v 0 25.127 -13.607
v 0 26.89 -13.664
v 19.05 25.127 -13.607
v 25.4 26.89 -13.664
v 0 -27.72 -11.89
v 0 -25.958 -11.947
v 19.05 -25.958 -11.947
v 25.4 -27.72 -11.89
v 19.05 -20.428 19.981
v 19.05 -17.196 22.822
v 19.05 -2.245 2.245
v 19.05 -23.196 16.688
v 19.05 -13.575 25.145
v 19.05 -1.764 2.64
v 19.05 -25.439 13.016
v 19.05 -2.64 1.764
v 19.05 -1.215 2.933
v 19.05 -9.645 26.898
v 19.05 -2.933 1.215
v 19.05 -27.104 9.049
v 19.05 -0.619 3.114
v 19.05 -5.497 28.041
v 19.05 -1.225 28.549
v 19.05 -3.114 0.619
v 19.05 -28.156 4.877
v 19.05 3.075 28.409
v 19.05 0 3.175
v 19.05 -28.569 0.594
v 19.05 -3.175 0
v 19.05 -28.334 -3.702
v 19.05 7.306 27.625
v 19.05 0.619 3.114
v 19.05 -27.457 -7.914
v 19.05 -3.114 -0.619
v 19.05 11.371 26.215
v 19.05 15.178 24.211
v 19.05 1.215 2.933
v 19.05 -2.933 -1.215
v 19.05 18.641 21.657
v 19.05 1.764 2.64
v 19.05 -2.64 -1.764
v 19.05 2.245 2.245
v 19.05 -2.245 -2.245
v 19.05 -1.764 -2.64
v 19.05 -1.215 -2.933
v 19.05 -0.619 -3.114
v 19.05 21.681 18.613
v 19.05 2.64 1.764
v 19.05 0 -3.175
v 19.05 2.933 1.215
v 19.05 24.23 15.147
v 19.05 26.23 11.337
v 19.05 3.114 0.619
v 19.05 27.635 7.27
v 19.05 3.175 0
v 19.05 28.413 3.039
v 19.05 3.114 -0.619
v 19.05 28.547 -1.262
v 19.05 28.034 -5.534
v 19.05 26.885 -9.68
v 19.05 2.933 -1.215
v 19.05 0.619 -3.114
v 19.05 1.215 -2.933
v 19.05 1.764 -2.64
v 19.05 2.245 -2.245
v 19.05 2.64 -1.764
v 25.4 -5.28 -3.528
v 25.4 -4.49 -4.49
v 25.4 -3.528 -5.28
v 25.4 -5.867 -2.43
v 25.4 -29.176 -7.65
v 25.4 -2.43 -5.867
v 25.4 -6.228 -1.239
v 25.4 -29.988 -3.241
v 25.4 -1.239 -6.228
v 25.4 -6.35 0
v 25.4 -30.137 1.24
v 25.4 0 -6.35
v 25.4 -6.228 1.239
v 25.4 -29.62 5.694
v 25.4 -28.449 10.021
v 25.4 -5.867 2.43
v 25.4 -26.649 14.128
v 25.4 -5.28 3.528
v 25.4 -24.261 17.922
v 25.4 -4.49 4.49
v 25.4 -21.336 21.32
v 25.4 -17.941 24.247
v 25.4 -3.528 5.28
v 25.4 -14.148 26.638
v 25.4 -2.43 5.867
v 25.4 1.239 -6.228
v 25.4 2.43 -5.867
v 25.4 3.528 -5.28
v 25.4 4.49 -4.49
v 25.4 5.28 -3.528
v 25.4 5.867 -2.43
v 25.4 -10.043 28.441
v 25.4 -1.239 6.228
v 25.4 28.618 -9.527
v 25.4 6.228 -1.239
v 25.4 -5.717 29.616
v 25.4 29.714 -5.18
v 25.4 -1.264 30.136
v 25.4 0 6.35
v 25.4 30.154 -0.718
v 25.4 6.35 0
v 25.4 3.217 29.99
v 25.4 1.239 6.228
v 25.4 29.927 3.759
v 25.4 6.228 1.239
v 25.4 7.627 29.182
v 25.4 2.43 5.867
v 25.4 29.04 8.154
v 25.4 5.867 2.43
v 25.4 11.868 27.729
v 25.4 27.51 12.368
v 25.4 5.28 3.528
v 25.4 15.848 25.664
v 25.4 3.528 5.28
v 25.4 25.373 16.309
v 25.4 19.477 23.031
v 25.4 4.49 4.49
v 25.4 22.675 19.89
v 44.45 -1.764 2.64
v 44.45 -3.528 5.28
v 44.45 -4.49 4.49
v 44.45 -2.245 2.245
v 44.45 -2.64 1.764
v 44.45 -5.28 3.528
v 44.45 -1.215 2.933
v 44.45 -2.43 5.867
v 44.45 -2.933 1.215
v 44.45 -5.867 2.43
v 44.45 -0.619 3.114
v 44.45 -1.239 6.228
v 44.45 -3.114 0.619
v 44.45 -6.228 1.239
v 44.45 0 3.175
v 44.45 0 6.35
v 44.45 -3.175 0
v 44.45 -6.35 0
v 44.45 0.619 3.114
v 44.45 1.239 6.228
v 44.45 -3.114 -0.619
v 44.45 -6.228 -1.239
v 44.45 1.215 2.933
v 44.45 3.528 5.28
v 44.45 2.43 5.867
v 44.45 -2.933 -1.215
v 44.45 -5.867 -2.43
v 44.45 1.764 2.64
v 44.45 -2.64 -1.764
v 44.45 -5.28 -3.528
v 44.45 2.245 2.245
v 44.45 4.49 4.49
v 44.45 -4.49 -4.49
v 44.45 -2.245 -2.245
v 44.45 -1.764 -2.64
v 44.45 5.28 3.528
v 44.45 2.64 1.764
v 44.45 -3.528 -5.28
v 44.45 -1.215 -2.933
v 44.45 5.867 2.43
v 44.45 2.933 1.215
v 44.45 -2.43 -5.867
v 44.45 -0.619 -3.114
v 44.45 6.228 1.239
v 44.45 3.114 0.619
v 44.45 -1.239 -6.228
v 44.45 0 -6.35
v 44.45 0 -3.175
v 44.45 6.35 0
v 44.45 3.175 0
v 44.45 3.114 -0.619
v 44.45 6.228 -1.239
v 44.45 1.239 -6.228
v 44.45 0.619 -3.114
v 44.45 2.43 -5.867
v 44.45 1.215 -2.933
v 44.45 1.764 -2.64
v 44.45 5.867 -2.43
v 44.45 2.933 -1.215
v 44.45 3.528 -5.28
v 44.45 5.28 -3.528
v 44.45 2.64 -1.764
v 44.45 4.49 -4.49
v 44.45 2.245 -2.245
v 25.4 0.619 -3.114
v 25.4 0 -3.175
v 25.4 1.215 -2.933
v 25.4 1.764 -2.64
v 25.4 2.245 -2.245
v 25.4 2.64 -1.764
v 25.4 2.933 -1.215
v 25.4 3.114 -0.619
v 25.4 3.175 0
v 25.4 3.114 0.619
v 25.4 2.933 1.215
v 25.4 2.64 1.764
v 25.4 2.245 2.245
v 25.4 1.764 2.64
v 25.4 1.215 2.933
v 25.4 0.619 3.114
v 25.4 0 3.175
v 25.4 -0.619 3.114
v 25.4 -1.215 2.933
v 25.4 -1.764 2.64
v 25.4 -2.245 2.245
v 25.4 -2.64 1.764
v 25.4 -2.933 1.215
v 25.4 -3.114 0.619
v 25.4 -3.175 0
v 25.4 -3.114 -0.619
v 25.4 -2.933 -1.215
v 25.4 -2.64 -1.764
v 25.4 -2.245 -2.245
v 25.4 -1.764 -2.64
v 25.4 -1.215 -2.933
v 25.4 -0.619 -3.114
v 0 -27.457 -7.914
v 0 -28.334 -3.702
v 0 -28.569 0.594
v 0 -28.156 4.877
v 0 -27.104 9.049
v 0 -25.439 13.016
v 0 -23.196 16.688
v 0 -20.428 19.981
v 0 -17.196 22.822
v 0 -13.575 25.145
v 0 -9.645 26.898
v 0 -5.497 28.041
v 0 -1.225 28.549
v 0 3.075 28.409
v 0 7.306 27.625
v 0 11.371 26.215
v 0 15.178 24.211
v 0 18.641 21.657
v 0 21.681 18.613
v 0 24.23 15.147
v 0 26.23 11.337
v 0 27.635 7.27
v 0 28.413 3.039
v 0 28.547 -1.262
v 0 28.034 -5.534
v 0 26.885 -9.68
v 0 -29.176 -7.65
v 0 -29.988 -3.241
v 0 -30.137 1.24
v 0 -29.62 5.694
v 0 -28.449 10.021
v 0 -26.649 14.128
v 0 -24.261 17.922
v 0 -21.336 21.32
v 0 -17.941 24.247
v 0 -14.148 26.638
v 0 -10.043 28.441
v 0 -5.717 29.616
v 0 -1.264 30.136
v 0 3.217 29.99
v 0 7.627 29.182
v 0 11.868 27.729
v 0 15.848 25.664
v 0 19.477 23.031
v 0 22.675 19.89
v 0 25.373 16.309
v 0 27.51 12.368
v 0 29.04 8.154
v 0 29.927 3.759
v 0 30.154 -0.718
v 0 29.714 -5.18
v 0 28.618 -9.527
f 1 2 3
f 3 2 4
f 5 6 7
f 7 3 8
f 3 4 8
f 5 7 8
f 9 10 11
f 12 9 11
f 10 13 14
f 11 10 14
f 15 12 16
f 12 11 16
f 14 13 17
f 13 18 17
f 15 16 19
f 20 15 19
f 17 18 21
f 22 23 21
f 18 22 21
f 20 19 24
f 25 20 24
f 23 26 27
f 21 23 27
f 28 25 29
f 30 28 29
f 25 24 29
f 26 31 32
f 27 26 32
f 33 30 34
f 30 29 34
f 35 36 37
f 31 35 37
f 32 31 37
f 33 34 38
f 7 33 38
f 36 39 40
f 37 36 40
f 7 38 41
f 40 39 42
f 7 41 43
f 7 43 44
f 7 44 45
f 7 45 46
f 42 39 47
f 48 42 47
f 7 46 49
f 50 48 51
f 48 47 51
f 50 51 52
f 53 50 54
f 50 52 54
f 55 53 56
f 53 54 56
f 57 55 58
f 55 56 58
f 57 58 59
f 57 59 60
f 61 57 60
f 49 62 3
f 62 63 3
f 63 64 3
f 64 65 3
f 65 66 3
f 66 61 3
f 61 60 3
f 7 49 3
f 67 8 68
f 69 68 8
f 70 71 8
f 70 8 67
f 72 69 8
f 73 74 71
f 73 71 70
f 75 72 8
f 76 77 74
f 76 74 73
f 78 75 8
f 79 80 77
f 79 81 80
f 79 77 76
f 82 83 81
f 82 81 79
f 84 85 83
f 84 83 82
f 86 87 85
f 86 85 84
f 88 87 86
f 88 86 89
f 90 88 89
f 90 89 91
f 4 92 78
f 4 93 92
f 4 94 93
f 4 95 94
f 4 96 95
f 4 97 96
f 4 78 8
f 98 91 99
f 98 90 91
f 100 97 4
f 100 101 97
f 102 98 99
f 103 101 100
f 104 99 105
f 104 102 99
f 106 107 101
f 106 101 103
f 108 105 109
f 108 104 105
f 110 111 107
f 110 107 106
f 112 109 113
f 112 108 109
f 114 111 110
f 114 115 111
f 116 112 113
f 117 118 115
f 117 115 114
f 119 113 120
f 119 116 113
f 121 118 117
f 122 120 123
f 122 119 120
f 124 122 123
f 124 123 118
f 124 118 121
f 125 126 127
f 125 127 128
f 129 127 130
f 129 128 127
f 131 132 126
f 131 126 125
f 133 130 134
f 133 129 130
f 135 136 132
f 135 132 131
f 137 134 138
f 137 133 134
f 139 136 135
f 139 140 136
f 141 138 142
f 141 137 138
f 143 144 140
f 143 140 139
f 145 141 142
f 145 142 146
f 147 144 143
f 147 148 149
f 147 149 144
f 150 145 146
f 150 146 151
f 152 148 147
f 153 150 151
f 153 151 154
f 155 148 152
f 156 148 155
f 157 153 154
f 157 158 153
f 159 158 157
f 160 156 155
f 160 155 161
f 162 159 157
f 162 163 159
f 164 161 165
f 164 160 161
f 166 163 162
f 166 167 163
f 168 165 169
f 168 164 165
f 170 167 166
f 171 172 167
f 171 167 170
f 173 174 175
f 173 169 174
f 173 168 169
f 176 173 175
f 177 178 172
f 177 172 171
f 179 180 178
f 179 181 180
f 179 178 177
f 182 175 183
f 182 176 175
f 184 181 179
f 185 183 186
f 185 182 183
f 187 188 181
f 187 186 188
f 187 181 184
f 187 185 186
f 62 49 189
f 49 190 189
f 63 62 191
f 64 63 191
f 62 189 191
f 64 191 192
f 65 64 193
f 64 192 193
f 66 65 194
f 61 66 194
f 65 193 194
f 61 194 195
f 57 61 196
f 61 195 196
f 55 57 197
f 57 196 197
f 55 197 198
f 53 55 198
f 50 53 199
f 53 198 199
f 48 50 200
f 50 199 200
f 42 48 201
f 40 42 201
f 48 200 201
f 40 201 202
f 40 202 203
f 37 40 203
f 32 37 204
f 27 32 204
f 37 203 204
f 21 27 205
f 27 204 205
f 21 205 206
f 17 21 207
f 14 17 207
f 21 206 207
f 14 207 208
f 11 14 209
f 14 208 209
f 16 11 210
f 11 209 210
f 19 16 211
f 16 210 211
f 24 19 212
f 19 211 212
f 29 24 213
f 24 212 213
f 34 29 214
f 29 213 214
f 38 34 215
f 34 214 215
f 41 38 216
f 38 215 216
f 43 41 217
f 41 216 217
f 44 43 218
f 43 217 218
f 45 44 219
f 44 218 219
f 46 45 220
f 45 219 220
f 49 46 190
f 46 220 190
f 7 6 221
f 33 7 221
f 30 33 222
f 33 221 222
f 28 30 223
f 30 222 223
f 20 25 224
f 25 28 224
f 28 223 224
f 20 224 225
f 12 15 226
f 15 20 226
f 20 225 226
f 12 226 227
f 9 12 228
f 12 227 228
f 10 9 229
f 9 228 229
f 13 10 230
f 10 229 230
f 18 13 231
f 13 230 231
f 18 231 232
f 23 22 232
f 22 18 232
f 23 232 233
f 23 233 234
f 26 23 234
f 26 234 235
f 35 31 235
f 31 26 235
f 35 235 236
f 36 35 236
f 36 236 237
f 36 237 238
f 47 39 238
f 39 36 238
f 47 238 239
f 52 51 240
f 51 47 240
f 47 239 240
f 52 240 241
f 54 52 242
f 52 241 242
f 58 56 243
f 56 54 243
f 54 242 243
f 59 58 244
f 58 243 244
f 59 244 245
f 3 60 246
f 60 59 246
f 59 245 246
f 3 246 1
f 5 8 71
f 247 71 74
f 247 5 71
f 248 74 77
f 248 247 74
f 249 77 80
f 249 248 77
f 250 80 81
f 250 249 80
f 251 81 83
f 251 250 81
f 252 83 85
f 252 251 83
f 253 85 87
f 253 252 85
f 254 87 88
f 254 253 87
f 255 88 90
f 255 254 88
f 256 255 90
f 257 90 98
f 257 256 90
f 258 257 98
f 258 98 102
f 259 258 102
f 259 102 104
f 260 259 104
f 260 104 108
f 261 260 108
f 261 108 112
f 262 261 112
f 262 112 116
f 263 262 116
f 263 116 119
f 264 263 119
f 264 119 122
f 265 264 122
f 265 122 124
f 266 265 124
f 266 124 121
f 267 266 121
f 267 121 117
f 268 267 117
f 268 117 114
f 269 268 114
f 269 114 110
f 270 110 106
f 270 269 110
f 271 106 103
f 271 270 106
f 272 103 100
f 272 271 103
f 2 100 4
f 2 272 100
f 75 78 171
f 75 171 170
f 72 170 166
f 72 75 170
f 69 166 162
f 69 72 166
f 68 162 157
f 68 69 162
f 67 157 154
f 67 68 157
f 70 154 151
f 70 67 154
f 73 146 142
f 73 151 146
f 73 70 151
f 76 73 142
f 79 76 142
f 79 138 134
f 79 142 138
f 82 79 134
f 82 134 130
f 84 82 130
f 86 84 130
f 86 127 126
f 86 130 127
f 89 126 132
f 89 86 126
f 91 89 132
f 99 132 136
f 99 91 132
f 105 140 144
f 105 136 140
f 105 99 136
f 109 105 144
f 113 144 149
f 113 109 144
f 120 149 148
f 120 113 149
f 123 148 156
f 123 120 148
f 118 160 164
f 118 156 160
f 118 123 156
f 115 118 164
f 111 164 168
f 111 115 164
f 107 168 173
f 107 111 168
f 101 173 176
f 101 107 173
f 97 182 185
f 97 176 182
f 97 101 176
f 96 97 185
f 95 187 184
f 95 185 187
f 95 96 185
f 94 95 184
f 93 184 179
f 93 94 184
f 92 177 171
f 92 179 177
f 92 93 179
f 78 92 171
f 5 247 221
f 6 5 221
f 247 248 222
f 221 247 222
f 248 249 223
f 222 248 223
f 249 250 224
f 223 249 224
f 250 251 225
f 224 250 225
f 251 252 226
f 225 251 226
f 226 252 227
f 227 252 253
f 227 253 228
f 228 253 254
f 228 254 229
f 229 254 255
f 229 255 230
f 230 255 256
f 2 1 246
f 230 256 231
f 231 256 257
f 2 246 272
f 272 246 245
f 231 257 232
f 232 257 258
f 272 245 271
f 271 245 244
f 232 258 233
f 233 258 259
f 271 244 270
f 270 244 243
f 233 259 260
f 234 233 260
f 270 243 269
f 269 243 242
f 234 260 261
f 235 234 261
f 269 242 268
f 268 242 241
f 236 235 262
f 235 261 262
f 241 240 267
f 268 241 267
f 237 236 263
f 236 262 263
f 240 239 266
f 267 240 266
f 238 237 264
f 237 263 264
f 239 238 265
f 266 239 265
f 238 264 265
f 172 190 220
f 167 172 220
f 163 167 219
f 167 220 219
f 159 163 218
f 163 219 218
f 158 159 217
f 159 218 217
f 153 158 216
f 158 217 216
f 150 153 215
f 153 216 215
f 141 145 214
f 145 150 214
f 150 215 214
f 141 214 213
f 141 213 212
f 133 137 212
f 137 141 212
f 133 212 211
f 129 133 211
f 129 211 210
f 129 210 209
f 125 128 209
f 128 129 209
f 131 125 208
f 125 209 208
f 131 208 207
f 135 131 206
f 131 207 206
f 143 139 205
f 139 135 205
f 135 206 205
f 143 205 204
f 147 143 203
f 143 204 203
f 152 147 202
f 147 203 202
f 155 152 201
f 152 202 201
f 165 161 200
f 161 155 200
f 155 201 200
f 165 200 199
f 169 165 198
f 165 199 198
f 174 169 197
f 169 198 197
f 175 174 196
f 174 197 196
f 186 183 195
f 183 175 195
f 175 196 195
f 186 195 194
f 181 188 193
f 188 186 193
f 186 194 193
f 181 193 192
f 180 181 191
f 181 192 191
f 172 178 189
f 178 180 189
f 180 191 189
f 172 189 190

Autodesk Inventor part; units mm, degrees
ref_plane "YZ Plane" through (0, 0, 0) normal (1, 0, 0) x (0, 1, 0)
ref_plane "XZ Plane" through (0, 0, 0) normal (0, 1, 0) x (-1, 0, 0)
ref_plane "XY Plane" through (0, 0, 0) normal (0, 0, 1) x (1, 0, 0)
sketch "Sketch1" plane through (0, 0, 0) normal (1, 0, 0) x (0, 1, 0)
  circle A0 centre (0, 0) radius 28.575
  circle A1 centre (0, 0) radius 30.1625
  dimension "d0" = 57.15
  dimension "d1" = 60.325
extrude "Extrusion1" add sketch "Sketch1" along normal blind 25.4
sketch "Sketch2" plane through (25.4, 0, 0) normal (1, 0, 0) x (0, 0, -1)
  circle A0 centre (0, 0) radius 28.575 projected
  circle A1 centre (0, 0) radius 30.1625 projected
extrude "Extrusion2" add sketch "Sketch2" against normal blind 6.35 contours A0 | A1
sketch "Sketch3" plane through (25.4, 0, 0) normal (1, 0, 0) x (0, 0, -1)
  line L0 (13.6642, 26.8899) -> (11.89, -27.7201)
  circle A0 centre (0, 0) radius 30.1625 projected
  dimension "d6" = 54.61
extrude "Extrusion3" cut sketch "Sketch3" against normal through all contours A0 L0 picked at (14.9201, 7.4757)
sketch "Sketch4" plane through (25.4, 0, 0) normal (1, 0, 0) x (0, 0, -1)
  circle A0 centre (0, 0) radius 3.175
  dimension "d9" = 6.35
extrude "Extrusion4" cut sketch "Sketch4" against normal through all
sketch "Sketch5" plane through (25.4, 0, 0) normal (1, 0, 0) x (0, 0, -1)
  circle A0 centre (0, 0) radius 3.175 projected
  circle A1 centre (0, 0) radius 6.35
  dimension "d12" = 6.35
  dimension "d13" = 12.7
extrude "Extrusion5" add sketch "Sketch5" along normal blind 19.05
properties part number "chain stashonary out part"
